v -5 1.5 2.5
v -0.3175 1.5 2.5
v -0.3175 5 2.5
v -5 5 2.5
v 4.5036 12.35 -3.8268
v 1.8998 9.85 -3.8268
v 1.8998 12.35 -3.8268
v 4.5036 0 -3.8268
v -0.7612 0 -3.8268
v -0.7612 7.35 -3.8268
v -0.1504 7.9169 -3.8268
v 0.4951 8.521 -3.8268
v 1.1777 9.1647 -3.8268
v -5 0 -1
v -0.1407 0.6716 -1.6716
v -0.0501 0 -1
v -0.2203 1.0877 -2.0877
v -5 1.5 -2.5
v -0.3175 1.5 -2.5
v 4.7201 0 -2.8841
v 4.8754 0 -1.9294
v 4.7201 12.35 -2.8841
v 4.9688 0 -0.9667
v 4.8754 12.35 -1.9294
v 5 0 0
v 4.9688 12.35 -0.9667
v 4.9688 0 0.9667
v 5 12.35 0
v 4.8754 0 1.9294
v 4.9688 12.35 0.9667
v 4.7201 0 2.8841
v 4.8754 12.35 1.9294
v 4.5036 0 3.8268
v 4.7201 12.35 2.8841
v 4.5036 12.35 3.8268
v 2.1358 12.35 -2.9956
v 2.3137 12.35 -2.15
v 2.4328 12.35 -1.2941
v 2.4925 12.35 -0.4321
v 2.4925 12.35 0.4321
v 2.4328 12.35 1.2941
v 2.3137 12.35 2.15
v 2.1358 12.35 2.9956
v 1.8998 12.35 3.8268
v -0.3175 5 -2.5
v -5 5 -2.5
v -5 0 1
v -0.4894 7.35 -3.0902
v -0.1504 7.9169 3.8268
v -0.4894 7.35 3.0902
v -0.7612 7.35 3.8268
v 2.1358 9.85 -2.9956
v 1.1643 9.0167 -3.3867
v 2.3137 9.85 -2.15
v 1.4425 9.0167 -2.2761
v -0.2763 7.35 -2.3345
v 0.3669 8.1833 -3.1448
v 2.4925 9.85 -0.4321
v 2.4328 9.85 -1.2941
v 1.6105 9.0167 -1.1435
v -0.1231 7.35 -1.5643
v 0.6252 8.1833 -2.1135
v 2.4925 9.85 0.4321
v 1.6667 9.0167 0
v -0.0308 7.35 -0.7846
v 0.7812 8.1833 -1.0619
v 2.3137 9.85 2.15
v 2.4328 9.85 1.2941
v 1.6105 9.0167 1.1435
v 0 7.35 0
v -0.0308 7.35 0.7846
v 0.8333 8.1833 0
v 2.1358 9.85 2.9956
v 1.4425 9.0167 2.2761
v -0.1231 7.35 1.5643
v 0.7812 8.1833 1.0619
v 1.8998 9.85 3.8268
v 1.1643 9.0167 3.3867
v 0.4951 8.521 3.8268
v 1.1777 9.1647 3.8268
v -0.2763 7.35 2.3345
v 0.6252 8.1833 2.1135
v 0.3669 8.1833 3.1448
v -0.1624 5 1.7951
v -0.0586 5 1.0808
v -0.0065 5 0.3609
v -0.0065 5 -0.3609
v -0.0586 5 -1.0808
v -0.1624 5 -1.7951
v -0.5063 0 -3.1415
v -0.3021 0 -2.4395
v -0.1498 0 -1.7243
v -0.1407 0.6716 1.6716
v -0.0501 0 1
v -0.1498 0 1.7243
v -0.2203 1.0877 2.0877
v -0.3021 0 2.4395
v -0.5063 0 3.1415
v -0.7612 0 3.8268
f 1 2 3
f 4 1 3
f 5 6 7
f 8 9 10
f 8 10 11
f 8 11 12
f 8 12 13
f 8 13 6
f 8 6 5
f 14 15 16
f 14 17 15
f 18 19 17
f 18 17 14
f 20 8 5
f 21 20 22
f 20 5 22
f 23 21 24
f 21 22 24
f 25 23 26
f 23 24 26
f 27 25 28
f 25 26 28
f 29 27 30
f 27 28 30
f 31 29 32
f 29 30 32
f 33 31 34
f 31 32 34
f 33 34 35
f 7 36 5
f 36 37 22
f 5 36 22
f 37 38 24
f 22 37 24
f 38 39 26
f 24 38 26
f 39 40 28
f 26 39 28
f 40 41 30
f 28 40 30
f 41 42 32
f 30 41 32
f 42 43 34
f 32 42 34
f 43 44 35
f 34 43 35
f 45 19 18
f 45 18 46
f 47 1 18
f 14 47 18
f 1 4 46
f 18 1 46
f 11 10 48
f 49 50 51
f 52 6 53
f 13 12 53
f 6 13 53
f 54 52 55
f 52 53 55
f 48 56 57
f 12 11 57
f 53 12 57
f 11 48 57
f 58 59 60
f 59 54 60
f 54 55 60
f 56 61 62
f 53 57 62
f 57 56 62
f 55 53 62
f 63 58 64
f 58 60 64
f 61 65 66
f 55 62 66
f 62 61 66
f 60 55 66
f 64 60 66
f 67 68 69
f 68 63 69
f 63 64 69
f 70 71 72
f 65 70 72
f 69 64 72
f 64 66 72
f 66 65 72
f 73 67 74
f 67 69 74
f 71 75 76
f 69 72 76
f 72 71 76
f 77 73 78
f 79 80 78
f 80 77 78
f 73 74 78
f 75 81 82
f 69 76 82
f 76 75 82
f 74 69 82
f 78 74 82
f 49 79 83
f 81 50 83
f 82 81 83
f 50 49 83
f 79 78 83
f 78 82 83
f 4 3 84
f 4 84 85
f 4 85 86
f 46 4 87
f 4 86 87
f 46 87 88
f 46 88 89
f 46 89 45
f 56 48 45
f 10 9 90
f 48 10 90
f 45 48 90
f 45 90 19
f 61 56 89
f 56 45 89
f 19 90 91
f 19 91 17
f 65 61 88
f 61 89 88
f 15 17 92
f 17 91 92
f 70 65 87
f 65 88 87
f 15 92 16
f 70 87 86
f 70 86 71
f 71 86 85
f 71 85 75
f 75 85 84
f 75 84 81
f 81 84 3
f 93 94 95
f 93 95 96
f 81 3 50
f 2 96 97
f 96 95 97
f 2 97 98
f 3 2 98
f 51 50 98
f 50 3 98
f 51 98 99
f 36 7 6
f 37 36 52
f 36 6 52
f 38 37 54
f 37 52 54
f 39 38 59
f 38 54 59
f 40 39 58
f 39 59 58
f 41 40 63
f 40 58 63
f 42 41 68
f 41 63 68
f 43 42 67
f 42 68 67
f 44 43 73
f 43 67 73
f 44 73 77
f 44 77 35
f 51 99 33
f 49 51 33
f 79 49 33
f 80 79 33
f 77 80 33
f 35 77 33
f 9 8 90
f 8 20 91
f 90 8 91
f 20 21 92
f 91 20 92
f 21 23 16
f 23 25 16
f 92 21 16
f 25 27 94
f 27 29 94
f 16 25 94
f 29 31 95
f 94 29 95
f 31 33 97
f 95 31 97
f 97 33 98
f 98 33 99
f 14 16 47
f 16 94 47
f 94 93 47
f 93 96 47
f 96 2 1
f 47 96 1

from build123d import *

# Parameters (mm, degrees)
REVOLVE1_ANGLE          = 45
SKETCH3_W               = 5
SKETCH3_H               = 5
BOSS_EXTRUDE2_DEPTH     = 5
CHAMFER2_SIZE           = 1.5
CUT_EXTRUDE1_DEPTH      = 1
CUT_EXTRUDE1_DEPTH_BACK = 13.35


with BuildPart() as part:
    # Sketch2 → Revolve1 (revolve, symmetric)
    with BuildSketch(Plane.XY) as revolve1_sk:
        Polygon((0, 0), (5, 0), (5, 12.35), (2.5, 12.35), (2.5, 9.85), (0, 7.35), align=None)
    revolve(axis=Axis((-10, 0, 0), (0, 1, 0)), revolution_arc=REVOLVE1_ANGLE / 2)
    revolve(revolve1_sk.sketch, axis=Axis((-10, 0, 0), (0, -1, 0)), revolution_arc=REVOLVE1_ANGLE / 2)

    # Sketch3 → Boss-Extrude2 (add)
    with BuildSketch(Plane(origin=(0, 0, 0), x_dir=(0, 0, -1), z_dir=(1, 0, 0))):
        with Locations((0, 2.5)):
            Rectangle(SKETCH3_W, SKETCH3_H)
    extrude(amount=-BOSS_EXTRUDE2_DEPTH)

    # Chamfer2
    chamfer2_edges = [part.edges().sort_by_distance(p)[0] for p in [
        (-2.658770817, 0, -2.5),
        (-2.658770817, 0, 2.5),
    ]]
    chamfer(chamfer2_edges, length=CHAMFER2_SIZE)

    # Sketch4 → Cut-Extrude1 (cut, two sides)
    with BuildSketch(Plane.XZ) as cut_extrude1_sk:
        with BuildLine():
            Line((-0.761204675, 3.826834324), (4.503631926, 3.826834324))
            ThreePointArc((4.503631926, 3.826834324), (4.213147766, 4.794416604), (3.858192988, 5.740251485))
            Line((3.858192988, 5.740251485), (-0.761204675, 3.826834324))
        make_face()
        with BuildLine():
            Line((-0.761204675, -3.826834324), (4.503631926, -3.826834324))
            ThreePointArc((4.503631926, -3.826834324), (4.213147766, -4.794416604), (3.858192988, -5.740251485))
            Line((3.858192988, -5.740251485), (-0.761204675, -3.826834324))
        make_face()
    extrude(amount=CUT_EXTRUDE1_DEPTH, mode=Mode.SUBTRACT)
    extrude(cut_extrude1_sk.sketch, amount=-CUT_EXTRUDE1_DEPTH_BACK, mode=Mode.SUBTRACT)


solid = part.part
